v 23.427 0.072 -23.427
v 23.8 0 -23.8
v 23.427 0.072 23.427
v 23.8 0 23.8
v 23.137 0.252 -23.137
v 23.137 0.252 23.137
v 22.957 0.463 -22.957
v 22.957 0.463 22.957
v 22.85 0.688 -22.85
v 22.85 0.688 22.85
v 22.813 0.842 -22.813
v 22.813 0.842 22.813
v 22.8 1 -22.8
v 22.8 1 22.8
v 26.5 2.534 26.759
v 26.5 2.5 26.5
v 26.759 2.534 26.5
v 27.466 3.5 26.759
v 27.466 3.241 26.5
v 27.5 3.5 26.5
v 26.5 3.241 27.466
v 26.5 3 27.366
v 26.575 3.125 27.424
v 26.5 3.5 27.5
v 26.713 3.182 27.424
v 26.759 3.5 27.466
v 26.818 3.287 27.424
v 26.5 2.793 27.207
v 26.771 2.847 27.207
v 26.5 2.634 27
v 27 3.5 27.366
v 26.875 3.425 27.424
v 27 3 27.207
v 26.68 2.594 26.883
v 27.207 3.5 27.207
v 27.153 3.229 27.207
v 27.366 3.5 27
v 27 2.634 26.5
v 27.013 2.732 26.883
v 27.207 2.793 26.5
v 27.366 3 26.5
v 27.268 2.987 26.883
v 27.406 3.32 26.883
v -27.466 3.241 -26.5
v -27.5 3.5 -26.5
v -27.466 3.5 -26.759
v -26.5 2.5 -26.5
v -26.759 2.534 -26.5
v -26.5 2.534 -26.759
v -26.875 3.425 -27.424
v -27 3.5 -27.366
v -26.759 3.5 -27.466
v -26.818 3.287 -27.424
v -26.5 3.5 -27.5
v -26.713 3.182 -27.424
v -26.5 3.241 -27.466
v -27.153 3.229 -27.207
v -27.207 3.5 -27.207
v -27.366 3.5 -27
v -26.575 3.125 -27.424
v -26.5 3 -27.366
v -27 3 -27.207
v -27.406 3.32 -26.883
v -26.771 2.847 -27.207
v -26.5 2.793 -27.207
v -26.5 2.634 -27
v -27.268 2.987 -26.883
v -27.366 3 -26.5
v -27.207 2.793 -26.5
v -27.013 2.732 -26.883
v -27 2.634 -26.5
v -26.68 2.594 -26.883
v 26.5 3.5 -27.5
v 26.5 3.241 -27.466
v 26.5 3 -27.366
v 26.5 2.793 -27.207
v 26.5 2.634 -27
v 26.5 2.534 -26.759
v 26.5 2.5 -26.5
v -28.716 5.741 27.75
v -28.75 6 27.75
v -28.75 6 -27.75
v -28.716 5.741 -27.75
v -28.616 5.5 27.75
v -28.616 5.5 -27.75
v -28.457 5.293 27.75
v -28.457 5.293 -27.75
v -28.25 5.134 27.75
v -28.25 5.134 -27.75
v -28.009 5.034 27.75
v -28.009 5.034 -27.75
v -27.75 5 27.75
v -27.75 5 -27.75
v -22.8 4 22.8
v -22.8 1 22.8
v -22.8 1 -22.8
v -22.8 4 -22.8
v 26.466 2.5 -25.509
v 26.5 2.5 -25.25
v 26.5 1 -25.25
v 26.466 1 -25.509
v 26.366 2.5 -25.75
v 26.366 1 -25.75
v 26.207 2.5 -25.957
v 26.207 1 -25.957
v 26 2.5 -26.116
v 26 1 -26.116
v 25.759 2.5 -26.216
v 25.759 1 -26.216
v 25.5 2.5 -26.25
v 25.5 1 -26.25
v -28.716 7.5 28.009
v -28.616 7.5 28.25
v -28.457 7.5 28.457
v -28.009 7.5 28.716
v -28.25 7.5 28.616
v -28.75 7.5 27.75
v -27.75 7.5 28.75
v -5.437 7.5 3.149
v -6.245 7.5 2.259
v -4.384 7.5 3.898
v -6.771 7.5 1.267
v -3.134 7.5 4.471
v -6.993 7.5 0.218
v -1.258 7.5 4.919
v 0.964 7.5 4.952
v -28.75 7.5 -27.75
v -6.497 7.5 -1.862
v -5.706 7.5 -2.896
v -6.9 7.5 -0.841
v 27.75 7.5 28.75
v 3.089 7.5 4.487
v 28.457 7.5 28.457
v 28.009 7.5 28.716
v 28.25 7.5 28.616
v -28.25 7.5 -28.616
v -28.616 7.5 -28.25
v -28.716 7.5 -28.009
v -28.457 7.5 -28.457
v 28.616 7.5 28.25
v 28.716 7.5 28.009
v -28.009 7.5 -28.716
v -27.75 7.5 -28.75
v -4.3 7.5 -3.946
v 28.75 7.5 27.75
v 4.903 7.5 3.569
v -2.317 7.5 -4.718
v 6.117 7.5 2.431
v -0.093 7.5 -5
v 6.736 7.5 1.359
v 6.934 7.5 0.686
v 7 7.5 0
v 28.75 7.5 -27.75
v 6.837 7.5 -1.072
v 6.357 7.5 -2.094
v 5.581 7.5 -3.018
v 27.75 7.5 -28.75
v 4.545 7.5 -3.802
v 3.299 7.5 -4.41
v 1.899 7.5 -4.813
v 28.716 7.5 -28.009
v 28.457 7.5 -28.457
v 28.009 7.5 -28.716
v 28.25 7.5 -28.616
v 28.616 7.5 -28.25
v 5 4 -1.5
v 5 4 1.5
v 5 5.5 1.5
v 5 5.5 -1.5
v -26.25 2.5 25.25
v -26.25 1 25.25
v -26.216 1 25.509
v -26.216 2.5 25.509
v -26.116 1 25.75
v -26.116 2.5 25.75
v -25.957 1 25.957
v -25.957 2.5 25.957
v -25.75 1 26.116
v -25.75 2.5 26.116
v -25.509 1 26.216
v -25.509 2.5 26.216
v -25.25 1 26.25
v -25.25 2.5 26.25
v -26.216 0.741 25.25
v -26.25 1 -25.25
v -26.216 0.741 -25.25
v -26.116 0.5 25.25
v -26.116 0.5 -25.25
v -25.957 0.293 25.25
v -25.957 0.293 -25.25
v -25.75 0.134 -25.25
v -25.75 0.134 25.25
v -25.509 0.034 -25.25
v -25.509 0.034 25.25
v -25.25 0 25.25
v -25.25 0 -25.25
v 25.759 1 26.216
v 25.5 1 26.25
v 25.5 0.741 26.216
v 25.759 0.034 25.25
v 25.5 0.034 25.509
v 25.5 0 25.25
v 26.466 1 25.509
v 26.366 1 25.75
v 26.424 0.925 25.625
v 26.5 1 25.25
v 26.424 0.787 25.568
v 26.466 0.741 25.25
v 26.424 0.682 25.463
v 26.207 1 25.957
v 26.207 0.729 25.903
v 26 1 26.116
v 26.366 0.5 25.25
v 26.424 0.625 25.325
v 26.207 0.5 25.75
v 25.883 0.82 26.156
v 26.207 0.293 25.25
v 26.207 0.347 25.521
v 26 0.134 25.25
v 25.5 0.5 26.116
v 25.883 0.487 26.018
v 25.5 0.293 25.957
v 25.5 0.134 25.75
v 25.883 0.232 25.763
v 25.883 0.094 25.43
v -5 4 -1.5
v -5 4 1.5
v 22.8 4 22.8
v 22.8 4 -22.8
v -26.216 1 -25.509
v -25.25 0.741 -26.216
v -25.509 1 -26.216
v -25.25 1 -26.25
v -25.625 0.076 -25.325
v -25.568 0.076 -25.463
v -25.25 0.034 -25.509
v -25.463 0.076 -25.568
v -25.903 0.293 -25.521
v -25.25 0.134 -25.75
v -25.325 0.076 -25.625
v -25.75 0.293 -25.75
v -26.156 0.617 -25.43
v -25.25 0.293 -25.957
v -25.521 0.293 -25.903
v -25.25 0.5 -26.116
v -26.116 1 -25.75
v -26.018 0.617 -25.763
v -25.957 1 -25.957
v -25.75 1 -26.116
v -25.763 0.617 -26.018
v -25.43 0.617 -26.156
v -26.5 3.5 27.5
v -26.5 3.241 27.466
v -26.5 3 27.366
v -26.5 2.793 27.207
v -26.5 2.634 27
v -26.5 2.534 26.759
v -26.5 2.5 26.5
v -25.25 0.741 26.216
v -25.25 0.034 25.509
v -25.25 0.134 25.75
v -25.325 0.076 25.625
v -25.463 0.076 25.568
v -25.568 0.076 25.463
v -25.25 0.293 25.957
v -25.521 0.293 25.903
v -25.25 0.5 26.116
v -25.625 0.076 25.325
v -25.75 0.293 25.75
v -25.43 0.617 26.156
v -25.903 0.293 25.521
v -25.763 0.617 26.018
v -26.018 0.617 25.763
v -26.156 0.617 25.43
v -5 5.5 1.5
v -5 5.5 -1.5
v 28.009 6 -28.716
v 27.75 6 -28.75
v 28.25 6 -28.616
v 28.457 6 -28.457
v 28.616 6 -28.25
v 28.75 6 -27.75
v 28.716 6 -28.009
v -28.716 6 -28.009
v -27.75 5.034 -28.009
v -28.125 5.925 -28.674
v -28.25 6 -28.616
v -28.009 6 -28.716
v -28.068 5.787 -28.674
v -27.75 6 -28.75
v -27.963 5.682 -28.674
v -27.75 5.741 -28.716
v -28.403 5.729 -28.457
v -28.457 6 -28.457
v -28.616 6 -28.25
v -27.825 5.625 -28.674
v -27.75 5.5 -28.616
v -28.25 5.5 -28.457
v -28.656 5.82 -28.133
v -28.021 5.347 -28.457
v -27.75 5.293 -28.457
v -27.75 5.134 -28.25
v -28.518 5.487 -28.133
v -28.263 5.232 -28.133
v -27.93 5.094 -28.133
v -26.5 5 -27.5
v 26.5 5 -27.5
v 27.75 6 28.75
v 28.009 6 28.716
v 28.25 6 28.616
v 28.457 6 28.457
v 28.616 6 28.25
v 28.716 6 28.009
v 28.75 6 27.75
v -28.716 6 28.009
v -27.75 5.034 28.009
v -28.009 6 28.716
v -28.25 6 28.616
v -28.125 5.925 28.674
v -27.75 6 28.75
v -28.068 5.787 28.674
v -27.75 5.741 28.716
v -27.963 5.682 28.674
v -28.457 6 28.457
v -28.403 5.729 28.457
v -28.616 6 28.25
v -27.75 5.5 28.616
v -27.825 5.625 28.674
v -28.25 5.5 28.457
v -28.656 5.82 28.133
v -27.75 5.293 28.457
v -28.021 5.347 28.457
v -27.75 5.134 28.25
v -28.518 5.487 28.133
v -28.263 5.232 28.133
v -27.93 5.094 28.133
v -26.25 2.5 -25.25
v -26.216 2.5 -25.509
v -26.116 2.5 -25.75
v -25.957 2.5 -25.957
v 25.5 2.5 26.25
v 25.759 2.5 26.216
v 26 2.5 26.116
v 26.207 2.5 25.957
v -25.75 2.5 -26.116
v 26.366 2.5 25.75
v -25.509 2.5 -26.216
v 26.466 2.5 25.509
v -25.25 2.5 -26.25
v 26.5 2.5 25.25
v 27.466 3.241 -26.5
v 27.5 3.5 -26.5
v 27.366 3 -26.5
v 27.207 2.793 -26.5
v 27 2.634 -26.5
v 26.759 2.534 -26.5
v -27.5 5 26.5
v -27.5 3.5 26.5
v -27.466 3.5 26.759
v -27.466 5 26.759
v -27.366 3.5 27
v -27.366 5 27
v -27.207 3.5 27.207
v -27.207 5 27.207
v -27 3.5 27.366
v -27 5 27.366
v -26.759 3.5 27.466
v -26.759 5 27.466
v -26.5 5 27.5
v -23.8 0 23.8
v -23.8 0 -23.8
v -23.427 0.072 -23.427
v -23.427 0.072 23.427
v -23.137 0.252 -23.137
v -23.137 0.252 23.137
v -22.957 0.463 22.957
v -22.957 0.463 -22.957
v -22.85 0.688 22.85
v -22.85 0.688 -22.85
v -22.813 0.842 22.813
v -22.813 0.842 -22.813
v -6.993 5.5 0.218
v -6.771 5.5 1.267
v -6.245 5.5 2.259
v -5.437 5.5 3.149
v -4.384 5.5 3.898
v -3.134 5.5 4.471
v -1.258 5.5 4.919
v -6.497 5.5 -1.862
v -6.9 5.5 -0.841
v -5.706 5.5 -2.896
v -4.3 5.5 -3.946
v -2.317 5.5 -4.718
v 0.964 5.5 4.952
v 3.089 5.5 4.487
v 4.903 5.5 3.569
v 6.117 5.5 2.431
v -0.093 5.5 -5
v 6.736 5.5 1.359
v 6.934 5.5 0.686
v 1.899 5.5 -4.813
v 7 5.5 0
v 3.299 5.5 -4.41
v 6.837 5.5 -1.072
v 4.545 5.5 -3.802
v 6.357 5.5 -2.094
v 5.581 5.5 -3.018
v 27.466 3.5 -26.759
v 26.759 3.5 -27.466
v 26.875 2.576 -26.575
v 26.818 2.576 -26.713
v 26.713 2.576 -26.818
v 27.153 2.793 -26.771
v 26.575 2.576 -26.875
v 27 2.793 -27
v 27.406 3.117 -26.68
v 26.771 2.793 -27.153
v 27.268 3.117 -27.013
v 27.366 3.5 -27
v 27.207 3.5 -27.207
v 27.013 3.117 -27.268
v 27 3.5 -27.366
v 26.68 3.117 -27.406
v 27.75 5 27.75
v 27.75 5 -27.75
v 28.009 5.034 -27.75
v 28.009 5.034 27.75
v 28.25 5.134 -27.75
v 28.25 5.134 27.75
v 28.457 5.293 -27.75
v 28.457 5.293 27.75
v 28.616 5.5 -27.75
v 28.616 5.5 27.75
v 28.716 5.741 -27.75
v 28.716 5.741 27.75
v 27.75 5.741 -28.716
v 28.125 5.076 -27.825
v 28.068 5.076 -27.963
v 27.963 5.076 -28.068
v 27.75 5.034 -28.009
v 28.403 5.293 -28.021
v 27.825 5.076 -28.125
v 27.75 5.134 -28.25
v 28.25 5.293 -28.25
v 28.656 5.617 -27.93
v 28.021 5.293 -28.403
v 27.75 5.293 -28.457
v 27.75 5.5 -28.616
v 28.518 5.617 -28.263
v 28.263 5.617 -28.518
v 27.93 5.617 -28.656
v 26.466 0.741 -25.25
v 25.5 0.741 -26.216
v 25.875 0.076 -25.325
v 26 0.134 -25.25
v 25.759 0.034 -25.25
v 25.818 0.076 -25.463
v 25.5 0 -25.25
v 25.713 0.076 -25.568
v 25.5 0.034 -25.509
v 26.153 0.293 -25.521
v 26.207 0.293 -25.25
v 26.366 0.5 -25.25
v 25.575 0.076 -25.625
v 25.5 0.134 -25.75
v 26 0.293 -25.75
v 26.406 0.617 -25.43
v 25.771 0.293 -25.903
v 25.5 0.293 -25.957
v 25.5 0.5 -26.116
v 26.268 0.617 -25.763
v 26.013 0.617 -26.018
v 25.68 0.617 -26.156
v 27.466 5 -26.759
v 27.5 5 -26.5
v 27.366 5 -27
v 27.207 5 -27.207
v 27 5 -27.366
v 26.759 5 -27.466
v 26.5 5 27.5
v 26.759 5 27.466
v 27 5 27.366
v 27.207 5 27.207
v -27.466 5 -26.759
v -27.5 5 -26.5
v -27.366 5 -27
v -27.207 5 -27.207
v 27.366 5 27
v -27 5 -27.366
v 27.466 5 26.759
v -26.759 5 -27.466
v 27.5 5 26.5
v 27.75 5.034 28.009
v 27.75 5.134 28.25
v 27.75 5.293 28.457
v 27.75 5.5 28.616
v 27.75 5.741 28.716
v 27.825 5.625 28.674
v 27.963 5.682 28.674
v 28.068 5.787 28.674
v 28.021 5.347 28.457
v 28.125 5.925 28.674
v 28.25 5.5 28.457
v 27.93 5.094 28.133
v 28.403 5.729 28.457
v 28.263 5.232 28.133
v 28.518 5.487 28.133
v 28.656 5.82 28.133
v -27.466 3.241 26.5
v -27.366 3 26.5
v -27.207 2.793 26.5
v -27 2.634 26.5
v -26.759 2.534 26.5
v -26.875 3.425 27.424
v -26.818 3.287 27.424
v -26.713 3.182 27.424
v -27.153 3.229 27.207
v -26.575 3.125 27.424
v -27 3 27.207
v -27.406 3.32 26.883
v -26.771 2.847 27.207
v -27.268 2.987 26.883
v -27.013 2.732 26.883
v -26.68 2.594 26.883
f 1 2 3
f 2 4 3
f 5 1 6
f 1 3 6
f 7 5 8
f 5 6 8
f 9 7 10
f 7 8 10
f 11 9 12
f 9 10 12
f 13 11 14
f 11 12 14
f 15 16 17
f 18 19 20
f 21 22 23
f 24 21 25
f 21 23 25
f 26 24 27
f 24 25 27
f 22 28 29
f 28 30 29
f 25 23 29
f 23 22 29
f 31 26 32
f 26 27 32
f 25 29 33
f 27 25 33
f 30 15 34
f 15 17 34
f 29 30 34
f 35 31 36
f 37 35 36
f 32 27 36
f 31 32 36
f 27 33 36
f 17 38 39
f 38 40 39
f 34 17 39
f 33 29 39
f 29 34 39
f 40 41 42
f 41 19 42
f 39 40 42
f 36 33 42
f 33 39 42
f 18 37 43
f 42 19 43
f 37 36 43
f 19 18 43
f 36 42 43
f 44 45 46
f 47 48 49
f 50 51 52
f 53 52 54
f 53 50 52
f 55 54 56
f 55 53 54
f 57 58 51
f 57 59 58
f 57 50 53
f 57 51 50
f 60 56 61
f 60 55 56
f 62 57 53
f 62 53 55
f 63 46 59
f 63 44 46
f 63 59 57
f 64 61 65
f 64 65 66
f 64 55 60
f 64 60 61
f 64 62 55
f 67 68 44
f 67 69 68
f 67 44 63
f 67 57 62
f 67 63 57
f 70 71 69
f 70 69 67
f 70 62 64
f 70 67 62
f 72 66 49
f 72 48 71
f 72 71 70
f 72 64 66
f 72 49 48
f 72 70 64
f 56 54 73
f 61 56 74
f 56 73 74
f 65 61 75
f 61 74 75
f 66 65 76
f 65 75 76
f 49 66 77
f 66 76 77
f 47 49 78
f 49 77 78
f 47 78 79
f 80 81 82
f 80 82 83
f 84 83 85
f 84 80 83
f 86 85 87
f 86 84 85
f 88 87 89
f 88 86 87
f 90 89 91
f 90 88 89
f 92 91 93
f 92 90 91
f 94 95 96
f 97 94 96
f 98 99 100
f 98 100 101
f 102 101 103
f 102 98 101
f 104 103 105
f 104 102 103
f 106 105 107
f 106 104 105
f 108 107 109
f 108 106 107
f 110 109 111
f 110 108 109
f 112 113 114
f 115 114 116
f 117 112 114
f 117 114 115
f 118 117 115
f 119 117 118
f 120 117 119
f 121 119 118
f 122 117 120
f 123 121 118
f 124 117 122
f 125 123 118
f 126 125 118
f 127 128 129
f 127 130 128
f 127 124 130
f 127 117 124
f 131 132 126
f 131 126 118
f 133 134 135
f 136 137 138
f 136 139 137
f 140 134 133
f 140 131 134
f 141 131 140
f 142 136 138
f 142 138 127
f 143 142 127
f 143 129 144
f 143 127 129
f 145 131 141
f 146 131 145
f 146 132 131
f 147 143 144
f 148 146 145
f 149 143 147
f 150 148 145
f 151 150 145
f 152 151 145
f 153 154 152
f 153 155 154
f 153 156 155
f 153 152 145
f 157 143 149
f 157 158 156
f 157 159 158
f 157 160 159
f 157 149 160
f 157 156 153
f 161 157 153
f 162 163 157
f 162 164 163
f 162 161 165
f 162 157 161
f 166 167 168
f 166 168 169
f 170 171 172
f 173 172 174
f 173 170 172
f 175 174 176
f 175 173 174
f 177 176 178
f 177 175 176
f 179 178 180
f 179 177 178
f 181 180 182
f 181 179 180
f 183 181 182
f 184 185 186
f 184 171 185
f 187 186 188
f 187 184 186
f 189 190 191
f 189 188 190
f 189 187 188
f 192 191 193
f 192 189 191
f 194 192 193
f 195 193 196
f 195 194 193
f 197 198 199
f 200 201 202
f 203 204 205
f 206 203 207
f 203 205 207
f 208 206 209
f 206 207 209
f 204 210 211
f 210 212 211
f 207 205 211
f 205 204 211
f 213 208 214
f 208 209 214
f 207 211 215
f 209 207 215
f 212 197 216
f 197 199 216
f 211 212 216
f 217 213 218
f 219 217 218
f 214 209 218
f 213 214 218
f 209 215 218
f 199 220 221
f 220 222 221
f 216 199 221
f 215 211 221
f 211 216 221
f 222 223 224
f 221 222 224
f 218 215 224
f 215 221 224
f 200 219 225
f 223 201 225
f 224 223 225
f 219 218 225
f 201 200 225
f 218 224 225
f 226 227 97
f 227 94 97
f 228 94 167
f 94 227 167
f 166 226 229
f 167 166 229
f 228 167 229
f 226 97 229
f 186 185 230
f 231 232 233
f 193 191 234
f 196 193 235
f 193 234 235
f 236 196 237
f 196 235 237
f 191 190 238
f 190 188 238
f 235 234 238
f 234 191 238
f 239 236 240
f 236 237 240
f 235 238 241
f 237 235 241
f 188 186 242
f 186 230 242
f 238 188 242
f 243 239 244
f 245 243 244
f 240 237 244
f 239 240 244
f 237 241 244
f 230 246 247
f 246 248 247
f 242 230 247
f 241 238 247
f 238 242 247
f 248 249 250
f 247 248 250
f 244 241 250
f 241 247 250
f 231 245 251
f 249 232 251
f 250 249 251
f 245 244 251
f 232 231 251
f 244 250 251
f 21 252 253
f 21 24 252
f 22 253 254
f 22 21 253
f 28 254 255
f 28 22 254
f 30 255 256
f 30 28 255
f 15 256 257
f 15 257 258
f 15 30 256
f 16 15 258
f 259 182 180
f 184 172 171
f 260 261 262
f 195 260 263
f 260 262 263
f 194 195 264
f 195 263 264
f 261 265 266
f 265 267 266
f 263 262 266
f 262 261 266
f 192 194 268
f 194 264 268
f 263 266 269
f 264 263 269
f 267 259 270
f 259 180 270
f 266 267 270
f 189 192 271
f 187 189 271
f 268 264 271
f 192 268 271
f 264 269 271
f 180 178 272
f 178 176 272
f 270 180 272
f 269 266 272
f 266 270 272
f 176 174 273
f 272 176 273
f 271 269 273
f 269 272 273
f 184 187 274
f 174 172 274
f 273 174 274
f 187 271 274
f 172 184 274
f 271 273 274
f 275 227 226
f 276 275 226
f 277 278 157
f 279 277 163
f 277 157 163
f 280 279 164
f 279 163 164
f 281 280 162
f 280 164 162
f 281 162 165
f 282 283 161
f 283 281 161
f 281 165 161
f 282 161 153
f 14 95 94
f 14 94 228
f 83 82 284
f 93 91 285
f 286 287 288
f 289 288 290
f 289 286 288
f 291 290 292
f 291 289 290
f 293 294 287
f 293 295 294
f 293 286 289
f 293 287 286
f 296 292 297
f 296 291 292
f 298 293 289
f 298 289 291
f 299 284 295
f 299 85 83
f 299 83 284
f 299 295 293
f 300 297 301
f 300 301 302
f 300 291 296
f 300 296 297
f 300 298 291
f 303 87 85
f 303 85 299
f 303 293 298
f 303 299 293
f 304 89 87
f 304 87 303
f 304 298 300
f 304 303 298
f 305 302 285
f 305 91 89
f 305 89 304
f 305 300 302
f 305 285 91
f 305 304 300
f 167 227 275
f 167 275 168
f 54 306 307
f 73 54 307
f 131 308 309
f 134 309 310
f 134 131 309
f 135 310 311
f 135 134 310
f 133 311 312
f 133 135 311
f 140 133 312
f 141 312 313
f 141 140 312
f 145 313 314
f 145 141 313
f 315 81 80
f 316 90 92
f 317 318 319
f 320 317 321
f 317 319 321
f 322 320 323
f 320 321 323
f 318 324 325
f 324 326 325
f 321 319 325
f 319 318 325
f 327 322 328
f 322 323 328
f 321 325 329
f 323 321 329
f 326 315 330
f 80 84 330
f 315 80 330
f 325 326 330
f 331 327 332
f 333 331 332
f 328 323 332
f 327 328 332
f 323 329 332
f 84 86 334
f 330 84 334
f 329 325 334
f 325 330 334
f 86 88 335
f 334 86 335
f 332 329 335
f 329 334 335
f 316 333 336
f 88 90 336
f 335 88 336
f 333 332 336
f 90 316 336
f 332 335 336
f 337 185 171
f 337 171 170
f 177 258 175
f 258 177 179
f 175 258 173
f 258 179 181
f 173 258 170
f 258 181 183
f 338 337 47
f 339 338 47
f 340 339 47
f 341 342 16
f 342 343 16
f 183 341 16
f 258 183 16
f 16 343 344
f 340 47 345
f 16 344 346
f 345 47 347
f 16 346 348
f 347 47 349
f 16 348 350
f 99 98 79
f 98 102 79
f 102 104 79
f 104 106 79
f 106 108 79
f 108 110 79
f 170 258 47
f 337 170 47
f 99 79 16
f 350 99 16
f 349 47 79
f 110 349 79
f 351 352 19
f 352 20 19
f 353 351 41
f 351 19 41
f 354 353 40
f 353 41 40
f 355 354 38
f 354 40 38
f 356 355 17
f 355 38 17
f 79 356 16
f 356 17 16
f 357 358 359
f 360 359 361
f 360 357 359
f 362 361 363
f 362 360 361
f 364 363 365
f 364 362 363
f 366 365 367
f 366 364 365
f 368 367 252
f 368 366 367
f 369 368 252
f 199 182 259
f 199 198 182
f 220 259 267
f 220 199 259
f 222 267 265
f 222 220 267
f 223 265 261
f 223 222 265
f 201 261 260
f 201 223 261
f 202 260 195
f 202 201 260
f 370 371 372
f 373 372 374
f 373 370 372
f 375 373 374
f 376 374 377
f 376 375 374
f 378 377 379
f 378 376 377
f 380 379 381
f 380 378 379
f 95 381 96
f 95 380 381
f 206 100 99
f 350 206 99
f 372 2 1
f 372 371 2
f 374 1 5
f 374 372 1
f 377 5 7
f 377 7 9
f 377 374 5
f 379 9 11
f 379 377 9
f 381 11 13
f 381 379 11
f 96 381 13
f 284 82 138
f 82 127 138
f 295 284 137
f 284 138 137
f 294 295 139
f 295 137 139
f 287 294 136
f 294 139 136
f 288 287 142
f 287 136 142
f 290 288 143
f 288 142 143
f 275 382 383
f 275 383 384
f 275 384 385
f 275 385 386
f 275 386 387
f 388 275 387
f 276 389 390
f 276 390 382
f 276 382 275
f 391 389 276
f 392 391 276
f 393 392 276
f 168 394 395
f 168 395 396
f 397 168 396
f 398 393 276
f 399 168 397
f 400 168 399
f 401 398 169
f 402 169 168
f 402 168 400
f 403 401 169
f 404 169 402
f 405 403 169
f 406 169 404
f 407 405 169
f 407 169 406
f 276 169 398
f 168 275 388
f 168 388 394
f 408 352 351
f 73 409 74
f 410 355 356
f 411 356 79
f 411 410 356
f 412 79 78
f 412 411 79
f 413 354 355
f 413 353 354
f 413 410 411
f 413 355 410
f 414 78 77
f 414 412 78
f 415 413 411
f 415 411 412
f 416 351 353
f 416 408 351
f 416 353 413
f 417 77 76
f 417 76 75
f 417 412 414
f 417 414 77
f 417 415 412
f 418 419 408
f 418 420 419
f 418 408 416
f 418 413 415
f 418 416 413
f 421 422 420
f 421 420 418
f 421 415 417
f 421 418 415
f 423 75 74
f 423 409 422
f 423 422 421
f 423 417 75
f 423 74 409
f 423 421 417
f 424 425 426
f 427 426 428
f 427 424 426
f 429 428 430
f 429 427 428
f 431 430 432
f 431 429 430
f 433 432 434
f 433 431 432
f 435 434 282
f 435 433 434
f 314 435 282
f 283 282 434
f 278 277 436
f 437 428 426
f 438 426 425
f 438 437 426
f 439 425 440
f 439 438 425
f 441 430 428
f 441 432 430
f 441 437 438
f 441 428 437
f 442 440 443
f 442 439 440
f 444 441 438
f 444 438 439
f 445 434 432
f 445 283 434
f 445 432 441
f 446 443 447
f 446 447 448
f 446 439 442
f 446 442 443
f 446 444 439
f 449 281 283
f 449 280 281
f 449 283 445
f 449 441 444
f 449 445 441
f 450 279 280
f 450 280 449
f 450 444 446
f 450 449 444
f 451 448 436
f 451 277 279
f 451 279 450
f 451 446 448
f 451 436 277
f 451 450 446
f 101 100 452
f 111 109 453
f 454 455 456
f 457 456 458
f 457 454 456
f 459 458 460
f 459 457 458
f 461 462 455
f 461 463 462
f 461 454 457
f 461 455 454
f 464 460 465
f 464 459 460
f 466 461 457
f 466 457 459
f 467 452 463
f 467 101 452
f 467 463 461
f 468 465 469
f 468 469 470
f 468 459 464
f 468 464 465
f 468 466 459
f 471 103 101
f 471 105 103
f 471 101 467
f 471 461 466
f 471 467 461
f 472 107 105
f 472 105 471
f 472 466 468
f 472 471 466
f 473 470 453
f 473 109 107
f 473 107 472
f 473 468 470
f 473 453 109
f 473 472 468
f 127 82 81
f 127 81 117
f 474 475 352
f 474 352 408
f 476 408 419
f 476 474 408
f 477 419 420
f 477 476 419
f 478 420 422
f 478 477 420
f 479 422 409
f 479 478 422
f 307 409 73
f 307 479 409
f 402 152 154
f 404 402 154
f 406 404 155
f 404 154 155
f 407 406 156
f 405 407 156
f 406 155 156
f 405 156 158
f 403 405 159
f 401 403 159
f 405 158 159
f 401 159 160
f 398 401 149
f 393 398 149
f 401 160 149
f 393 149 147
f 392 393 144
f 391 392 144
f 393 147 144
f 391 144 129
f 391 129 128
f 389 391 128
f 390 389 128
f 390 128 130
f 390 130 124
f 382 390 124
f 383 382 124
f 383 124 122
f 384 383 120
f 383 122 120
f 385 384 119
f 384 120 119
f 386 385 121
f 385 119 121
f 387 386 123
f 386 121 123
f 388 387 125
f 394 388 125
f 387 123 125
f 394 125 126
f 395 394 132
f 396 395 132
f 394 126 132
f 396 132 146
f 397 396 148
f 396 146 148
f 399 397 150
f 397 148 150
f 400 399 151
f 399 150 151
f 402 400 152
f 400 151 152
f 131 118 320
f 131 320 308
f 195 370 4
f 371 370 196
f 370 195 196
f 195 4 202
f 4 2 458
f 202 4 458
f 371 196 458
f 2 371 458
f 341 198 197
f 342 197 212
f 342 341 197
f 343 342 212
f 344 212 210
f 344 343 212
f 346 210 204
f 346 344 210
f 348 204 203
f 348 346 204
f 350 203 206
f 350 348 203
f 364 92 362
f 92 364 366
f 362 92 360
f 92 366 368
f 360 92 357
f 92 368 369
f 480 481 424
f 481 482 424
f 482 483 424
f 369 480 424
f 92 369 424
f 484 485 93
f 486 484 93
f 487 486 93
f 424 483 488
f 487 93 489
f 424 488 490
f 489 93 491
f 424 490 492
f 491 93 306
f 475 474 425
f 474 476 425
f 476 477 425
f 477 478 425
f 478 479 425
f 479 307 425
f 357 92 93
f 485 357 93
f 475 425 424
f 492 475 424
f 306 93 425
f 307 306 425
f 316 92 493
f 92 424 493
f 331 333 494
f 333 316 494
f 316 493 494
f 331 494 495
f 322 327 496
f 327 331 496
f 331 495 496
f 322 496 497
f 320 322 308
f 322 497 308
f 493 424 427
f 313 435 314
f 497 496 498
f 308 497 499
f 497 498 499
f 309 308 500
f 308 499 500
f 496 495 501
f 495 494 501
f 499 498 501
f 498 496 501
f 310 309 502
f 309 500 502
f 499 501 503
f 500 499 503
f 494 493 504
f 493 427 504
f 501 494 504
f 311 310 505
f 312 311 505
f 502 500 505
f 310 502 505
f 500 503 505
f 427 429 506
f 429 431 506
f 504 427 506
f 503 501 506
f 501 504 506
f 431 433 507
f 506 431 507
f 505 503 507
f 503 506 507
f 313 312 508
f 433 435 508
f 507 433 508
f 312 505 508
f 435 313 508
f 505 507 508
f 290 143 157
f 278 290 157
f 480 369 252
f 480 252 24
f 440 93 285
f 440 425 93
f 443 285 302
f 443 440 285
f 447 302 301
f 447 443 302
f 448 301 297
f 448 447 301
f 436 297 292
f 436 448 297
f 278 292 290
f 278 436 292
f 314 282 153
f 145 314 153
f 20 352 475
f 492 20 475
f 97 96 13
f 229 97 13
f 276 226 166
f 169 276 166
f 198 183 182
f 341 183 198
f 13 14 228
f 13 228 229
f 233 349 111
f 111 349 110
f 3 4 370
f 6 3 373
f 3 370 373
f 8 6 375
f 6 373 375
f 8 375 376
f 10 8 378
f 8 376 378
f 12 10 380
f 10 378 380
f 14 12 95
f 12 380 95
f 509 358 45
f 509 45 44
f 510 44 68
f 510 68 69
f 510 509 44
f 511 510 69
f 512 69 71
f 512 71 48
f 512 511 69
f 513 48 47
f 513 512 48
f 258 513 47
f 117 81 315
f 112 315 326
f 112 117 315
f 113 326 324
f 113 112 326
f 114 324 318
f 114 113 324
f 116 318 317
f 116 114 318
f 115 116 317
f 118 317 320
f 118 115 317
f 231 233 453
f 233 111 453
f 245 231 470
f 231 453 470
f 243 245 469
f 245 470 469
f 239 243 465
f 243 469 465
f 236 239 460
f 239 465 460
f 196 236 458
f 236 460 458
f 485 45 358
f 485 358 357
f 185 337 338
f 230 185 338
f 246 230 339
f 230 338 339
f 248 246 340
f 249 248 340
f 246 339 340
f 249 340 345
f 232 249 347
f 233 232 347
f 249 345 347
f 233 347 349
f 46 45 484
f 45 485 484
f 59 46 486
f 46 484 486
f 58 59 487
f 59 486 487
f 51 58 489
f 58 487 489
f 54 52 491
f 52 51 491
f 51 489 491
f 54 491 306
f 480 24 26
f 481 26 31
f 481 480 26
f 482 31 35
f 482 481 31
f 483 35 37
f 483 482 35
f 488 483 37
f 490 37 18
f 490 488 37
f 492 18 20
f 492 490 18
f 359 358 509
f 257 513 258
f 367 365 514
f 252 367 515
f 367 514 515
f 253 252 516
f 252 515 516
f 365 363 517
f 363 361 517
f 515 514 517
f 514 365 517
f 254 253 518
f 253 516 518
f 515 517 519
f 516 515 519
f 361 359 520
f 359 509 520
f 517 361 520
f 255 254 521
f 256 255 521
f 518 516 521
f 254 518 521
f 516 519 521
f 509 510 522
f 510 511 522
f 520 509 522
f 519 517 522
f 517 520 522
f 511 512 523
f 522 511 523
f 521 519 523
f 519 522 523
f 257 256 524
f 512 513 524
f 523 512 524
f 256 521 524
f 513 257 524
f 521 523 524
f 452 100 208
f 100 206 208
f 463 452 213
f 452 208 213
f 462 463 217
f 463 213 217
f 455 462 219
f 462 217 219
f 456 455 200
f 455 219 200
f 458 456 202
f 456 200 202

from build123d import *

# Parameters (mm, degrees)
BOSS_EXTRUDE4_DEPTH      = 26.25
BOSS_EXTRUDE4_DEPTH_BACK = 26.25
SKETCH7_W                = 52.75
SKETCH7_H                = 2.5
BOSS_EXTRUDE5_DEPTH      = 27.5
BOSS_EXTRUDE5_DEPTH_BACK = 27.5
SKETCH8_W                = 55
SKETCH8_H                = 2.5
BOSS_EXTRUDE6_DEPTH      = 28.75
BOSS_EXTRUDE6_DEPTH_BACK = 28.75
SKETCH9_W                = 57.5
SKETCH9_H                = 2.5
CUT_EXTRUDE1_DEPTH       = 4
CUT_EXTRUDE1_DEPTH_BACK  = 4.5
SKETCH10_W               = 45.6
SKETCH10_H               = 45.6
SKETCH12_RX              = 7
SKETCH12_RY              = 5
CUT_EXTRUDE2_DEPTH       = 2
CUT_EXTRUDE3_DEPTH       = 29
CUT_EXTRUDE3_DEPTH_BACK  = 42.344588521
SKETCH13_W               = 10
SKETCH13_H               = 3
FILLET4_R                = 1


with BuildPart() as part:
    # Sketch7 → Boss-Extrude4 (new, two sides: drawn at the far end of the back side and taken through both)
    with BuildSketch(Plane.XY.offset(-BOSS_EXTRUDE4_DEPTH_BACK)):
        with Locations((0.125, 1.25)):
            Rectangle(SKETCH7_W, SKETCH7_H)
    extrude(amount=BOSS_EXTRUDE4_DEPTH + BOSS_EXTRUDE4_DEPTH_BACK)

    # Sketch8 → Boss-Extrude5 (add, two sides: drawn at the far end of the back side and taken through both)
    with BuildSketch(Plane.XY.offset(-BOSS_EXTRUDE5_DEPTH_BACK)):
        with Locations((0, 3.75)):
            Rectangle(SKETCH8_W, SKETCH8_H)
    extrude(amount=BOSS_EXTRUDE5_DEPTH + BOSS_EXTRUDE5_DEPTH_BACK)

    # Sketch9 → Boss-Extrude6 (add, two sides: drawn at the far end of the back side and taken through both)
    with BuildSketch(Plane.XY.offset(-BOSS_EXTRUDE6_DEPTH_BACK)):
        with Locations((0, 6.25)):
            Rectangle(SKETCH9_W, SKETCH9_H)
    extrude(amount=BOSS_EXTRUDE6_DEPTH + BOSS_EXTRUDE6_DEPTH_BACK)

    # Sketch10 → Cut-Extrude1 (cut, two sides: drawn at the far end of the back side and taken through both)
    with BuildSketch(Plane(origin=(0, 0, 0), x_dir=(1, 0, 0), z_dir=(0, 1, 0)).offset(-CUT_EXTRUDE1_DEPTH_BACK)):
        Rectangle(SKETCH10_W, SKETCH10_H)
    extrude(amount=CUT_EXTRUDE1_DEPTH + CUT_EXTRUDE1_DEPTH_BACK, mode=Mode.SUBTRACT)

    # Sketch12 → Cut-Extrude2 (cut)
    with BuildSketch(Plane(origin=(0, 7.5, 0), x_dir=(1, 0, 0), z_dir=(0, 1, 0))):
        with Locations((0, 0)):
            Ellipse(SKETCH12_RX, SKETCH12_RY)
    extrude(amount=-CUT_EXTRUDE2_DEPTH, mode=Mode.SUBTRACT)

    # Sketch13 → Cut-Extrude3 (cut, two sides: drawn at the far end of the back side and taken through both)
    with BuildSketch(Plane(origin=(0, 0, 0), x_dir=(1, 0, 0), z_dir=(0, 1, 0)).offset(-CUT_EXTRUDE3_DEPTH_BACK)):
        Rectangle(SKETCH13_W, SKETCH13_H)
    extrude(amount=CUT_EXTRUDE3_DEPTH + CUT_EXTRUDE3_DEPTH_BACK, mode=Mode.SUBTRACT)

    # Fillet4
    fillet4_edges = [part.edges().sort_by_distance(p)[0] for p in [
        (-26.25, 1.25, 26.25),
        (26.5, 1.25, -26.25),
        (0.125, 0, 26.25),
        (26.5, 1.25, 26.25),
        (-27.5, 2.5, 0),
        (-27.5, 3.75, -27.5),
        (27.5, 3.75, -27.5),
        (27.5, 2.5, 0),
        (0, 2.5, -27.5),
        (-27.5, 3.75, 27.5),
        (0, 2.5, 27.5),
        (27.5, 3.75, 27.5),
        (-28.75, 5, 0),
        (-28.75, 6.25, -28.75),
        (28.75, 6.25, -28.75),
        (28.75, 5, 0),
        (0, 5, -28.75),
        (-28.75, 6.25, 28.75),
        (0, 5, 28.75),
        (28.75, 6.25, 28.75),
        (-26.25, 1.25, -26.25),
        (0, 0, -22.8),
        (22.8, 0, 0),
        (0, 0, 22.8),
        (-22.8, 0, 0),
        (26.5, 0, 0),
        (-26.25, 0, 0),
        (0.125, 0, -26.25),
    ]]
    fillet(fillet4_edges, radius=FILLET4_R - 0.0001)  # a hair under: the kernel refuses the full size


solid = part.part
